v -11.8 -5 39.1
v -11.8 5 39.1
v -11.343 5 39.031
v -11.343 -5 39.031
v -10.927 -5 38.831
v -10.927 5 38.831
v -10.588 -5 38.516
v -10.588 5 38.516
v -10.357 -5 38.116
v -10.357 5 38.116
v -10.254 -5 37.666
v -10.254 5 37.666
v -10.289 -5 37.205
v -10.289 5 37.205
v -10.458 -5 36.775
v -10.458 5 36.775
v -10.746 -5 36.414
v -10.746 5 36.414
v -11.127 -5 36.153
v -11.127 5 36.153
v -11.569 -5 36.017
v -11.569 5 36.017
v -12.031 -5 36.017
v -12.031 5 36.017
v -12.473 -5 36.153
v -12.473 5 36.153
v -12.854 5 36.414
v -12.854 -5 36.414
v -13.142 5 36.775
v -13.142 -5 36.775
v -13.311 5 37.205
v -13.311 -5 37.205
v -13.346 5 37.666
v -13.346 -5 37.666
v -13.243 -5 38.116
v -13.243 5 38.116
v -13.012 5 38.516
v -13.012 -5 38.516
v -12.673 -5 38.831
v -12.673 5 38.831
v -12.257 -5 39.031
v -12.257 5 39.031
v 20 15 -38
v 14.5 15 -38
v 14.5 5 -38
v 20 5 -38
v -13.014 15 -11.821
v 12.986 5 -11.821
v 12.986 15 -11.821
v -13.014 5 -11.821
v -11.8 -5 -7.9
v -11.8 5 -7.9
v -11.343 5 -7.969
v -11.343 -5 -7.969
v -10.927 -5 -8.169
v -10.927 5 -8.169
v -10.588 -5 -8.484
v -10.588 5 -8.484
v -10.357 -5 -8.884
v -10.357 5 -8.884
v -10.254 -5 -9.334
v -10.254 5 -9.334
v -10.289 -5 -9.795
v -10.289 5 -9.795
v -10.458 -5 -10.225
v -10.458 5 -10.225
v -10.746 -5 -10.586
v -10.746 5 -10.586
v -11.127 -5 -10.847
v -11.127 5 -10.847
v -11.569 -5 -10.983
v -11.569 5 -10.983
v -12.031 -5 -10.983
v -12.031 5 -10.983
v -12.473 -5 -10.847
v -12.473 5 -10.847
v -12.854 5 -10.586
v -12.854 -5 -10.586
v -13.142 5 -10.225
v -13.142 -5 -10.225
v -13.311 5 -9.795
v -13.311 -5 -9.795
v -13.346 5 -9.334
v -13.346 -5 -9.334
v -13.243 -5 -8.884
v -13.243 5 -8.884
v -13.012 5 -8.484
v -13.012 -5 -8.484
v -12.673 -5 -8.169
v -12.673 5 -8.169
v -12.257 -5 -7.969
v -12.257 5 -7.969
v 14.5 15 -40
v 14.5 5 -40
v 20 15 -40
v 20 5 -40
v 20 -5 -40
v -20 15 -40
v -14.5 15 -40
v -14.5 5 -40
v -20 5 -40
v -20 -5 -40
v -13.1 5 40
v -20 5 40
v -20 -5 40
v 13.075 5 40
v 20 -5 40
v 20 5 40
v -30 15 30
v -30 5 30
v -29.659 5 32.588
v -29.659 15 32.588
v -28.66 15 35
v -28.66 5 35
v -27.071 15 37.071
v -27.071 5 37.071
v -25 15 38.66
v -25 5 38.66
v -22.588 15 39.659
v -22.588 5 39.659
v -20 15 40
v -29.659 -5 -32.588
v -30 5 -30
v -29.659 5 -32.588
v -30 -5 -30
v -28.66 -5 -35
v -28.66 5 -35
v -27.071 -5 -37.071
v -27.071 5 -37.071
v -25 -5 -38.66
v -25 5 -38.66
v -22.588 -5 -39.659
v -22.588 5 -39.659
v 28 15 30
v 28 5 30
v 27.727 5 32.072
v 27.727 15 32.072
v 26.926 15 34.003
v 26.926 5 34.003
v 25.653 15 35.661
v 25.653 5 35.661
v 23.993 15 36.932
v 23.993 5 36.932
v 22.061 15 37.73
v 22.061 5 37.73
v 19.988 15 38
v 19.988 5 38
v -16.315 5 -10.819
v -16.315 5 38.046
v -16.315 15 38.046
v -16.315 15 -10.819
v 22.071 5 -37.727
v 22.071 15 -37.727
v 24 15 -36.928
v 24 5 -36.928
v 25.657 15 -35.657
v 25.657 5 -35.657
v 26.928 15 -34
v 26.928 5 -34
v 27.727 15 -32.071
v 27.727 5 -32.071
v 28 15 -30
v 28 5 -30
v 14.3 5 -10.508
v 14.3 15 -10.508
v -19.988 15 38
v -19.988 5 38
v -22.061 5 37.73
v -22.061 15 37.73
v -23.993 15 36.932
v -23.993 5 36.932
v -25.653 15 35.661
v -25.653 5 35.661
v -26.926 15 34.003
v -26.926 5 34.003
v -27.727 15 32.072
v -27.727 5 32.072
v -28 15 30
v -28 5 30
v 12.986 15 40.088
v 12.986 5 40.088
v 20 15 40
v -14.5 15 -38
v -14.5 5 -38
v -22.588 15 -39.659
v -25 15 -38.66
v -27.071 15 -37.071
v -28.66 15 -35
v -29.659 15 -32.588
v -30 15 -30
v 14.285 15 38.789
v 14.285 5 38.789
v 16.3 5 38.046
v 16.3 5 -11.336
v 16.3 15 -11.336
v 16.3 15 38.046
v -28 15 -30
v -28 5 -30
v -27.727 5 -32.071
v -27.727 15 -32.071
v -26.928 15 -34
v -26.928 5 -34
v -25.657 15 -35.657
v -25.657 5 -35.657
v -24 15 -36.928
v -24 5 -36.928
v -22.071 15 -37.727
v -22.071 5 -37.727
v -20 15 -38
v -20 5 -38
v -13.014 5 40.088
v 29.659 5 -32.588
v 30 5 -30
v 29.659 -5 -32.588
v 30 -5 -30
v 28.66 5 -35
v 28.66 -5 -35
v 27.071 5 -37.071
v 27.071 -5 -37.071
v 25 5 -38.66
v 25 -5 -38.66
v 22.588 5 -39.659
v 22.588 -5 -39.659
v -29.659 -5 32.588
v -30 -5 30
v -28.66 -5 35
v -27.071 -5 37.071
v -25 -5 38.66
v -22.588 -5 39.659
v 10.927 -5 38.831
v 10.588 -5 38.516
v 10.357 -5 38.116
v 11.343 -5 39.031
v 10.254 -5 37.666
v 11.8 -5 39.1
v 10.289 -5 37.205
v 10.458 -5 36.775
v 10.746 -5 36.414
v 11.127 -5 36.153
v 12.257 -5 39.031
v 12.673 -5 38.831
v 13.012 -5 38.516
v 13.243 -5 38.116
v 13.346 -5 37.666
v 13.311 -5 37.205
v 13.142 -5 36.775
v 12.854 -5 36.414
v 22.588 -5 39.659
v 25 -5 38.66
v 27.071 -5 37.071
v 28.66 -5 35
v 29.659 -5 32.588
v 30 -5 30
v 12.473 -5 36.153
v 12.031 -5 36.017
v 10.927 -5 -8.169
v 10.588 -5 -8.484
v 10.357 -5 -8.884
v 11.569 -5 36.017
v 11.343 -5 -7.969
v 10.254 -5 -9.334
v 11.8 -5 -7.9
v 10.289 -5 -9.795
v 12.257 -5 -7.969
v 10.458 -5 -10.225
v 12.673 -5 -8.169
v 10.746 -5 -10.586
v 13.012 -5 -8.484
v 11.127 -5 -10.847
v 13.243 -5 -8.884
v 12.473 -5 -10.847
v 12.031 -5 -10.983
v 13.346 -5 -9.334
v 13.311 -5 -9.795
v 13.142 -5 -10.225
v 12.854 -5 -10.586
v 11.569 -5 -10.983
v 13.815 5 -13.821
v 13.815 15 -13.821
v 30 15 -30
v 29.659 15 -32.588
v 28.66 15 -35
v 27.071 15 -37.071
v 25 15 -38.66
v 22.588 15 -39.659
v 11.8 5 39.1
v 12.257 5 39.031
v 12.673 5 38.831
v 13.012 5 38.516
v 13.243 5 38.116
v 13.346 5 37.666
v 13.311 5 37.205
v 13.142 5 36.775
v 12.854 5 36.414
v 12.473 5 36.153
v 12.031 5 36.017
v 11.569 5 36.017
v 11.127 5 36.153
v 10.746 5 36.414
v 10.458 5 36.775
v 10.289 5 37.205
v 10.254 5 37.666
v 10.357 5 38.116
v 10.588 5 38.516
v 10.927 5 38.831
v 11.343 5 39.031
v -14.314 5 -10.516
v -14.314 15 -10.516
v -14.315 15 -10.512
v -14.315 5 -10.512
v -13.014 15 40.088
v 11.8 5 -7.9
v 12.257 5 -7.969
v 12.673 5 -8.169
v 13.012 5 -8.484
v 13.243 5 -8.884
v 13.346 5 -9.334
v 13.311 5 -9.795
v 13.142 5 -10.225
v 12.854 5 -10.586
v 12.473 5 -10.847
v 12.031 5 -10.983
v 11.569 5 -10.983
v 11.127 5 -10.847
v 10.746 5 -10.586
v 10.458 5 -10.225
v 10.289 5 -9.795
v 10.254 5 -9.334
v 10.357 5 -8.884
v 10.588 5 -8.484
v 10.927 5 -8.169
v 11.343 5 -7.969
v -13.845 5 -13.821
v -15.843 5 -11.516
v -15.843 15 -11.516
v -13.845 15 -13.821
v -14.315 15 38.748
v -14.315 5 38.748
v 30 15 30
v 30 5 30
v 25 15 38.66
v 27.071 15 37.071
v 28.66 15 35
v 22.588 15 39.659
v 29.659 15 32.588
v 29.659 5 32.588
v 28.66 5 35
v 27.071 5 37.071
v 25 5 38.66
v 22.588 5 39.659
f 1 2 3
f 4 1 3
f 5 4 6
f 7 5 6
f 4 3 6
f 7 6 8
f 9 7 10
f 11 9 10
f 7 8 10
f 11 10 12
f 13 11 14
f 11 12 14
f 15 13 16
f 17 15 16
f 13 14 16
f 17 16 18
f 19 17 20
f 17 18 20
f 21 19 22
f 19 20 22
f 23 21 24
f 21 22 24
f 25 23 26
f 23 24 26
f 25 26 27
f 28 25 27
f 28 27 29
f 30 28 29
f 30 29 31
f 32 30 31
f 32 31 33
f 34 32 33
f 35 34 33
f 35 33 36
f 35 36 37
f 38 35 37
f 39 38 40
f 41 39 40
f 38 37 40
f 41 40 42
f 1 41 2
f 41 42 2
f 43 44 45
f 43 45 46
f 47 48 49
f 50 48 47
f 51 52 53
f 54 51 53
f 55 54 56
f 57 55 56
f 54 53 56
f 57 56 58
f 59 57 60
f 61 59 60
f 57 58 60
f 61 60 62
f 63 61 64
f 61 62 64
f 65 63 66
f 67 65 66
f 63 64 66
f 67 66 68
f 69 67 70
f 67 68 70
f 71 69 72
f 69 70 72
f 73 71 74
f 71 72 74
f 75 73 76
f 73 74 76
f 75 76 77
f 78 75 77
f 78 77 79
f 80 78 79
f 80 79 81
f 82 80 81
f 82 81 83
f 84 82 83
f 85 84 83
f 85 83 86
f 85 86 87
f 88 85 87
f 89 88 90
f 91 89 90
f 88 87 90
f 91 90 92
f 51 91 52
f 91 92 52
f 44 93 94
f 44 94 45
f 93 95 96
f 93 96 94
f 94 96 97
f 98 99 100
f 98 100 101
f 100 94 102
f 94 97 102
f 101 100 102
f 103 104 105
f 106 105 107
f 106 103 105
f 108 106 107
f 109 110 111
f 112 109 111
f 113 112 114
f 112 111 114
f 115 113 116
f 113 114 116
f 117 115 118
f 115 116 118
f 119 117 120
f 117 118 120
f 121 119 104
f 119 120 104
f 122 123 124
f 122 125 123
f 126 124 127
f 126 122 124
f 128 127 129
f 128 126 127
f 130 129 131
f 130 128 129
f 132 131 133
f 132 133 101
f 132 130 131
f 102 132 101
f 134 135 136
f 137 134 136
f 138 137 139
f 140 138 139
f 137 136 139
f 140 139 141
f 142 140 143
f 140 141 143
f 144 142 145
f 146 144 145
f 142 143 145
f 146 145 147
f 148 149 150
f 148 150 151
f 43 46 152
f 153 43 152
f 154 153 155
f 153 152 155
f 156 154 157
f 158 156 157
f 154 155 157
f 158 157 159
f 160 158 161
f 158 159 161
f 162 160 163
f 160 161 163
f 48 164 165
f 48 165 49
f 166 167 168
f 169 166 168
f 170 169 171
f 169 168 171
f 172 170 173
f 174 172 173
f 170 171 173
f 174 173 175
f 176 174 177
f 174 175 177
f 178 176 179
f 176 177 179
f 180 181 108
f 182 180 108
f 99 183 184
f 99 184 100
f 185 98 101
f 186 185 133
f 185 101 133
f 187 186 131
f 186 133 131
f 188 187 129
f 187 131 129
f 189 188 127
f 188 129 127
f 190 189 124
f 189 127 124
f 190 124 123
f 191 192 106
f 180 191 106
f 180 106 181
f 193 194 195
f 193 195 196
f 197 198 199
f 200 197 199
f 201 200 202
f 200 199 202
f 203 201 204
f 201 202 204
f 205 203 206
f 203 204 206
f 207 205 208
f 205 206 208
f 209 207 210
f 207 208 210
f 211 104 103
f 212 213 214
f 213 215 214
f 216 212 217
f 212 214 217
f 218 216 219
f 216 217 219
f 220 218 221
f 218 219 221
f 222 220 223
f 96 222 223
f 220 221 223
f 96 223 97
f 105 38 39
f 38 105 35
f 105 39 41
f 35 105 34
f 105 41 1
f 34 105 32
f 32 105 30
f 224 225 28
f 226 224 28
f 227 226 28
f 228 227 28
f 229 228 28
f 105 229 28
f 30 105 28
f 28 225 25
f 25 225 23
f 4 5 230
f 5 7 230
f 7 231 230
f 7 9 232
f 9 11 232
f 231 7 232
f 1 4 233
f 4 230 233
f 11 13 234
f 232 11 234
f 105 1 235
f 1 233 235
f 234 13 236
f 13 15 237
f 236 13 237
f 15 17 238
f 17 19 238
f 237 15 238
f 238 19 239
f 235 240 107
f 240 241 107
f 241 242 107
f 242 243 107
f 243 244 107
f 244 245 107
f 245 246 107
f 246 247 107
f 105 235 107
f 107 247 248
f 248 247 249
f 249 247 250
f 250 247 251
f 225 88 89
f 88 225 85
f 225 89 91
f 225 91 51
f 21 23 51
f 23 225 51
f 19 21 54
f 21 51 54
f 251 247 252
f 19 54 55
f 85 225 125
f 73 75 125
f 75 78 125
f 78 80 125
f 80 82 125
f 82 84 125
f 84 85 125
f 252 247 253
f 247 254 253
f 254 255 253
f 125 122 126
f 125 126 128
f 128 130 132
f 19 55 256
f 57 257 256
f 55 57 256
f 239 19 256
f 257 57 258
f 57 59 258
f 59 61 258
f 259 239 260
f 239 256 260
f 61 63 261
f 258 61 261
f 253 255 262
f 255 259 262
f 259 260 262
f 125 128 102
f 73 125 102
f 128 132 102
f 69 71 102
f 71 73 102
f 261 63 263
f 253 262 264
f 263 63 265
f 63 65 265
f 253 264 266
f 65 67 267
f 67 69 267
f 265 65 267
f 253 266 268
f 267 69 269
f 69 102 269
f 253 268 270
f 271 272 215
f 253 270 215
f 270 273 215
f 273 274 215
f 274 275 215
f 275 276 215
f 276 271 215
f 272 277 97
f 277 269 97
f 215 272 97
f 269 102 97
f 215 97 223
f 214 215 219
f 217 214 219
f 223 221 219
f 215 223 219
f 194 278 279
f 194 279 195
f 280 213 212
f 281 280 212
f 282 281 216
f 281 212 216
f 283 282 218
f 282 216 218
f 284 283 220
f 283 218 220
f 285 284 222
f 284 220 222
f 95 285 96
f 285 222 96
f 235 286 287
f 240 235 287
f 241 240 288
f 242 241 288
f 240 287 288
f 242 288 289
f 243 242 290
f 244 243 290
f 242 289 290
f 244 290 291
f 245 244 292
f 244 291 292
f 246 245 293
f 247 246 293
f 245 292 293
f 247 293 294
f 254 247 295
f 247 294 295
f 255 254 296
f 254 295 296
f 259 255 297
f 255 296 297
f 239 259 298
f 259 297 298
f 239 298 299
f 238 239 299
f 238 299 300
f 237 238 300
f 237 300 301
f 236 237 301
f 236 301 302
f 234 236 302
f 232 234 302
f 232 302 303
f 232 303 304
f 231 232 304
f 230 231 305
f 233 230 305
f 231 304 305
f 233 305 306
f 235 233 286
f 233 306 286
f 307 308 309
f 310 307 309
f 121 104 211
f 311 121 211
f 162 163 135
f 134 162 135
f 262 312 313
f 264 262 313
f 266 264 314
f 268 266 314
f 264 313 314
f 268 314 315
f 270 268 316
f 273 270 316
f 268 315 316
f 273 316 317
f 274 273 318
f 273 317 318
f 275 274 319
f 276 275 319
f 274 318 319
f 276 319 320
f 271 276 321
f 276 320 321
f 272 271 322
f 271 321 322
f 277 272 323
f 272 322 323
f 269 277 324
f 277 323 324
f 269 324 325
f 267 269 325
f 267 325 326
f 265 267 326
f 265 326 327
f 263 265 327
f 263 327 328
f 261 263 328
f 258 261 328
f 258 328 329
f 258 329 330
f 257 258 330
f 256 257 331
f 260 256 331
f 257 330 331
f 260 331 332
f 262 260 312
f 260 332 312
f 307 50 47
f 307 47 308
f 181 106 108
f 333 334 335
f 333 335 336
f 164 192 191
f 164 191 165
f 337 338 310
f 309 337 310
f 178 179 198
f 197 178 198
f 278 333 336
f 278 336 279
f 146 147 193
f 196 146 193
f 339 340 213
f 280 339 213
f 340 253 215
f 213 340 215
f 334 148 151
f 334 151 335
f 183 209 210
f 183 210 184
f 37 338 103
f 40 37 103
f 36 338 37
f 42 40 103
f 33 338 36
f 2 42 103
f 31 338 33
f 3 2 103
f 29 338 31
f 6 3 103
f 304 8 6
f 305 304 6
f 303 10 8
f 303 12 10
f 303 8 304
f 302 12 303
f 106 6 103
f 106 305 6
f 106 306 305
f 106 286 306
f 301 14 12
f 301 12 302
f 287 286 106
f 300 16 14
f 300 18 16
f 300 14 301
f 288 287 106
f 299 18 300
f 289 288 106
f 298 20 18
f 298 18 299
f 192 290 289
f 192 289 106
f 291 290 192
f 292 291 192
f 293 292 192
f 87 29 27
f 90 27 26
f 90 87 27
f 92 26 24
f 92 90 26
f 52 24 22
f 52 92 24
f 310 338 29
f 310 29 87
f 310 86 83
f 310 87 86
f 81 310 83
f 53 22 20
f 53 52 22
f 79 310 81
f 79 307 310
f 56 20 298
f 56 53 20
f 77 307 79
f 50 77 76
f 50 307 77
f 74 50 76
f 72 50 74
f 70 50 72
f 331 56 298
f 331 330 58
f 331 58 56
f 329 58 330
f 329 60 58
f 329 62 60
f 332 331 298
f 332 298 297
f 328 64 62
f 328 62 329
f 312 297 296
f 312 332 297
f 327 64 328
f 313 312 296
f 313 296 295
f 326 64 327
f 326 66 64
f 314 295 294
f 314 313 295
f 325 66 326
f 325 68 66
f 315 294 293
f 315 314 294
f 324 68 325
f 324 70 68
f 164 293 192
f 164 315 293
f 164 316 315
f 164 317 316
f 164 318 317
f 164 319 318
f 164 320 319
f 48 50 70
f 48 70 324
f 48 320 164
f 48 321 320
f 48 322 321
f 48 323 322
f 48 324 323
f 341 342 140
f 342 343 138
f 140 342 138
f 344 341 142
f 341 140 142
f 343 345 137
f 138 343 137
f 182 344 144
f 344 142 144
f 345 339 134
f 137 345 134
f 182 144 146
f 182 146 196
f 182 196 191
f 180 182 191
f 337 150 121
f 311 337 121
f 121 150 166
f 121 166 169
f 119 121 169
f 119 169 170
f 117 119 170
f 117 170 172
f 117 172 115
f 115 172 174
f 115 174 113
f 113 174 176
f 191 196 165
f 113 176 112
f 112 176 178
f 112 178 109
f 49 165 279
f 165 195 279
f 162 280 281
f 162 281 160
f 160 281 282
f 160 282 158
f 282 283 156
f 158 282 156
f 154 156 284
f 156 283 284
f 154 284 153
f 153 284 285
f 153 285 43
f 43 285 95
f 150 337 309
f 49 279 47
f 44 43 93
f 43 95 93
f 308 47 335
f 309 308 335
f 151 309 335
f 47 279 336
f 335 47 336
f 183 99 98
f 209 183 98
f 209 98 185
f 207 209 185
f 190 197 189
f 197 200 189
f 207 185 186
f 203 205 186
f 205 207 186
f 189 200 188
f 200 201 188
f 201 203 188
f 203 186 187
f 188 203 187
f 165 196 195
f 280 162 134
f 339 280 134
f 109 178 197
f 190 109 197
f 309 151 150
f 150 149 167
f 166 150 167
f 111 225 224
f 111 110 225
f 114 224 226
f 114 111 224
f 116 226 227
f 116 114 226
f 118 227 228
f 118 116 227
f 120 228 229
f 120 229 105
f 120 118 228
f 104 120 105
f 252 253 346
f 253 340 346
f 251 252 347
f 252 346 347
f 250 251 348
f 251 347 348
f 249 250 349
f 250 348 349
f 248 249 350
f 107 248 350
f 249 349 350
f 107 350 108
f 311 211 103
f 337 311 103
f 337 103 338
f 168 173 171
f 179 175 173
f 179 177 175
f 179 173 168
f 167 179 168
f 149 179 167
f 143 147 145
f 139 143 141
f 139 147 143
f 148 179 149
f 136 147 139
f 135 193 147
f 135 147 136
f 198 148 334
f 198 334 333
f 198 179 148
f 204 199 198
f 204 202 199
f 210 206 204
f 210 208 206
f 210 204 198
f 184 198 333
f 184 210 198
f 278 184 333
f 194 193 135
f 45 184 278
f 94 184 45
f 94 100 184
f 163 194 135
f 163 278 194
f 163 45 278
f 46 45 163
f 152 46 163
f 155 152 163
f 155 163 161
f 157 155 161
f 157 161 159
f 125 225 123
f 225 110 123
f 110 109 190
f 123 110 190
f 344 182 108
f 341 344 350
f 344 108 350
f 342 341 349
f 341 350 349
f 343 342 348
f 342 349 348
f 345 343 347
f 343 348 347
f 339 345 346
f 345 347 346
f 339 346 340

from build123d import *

# Parameters (mm, degrees)
SKETCH1_W           = 60
SKETCH1_H           = 80
BOSS_EXTRUDE1_DEPTH = 5
FILLET1_R           = 10
SKETCH3_R           = 1.55
CUT_EXTRUDE11_DEPTH = 10
BOSS_EXTRUDE2_DEPTH = 10
BOSS_EXTRUDE3_DEPTH = 10


with BuildPart() as part:
    # Sketch1 → Boss-Extrude1 (new, symmetric)
    with BuildSketch(Plane(origin=(0, 0, 0), x_dir=(1, 0, 0), z_dir=(0, 1, 0))):
        Rectangle(SKETCH1_W, SKETCH1_H)
    extrude(amount=BOSS_EXTRUDE1_DEPTH, both=True)

    # Fillet1
    fillet1_edges = [part.edges().sort_by_distance(p)[0] for p in [
        (-30, 0, -40),
        (30, 0, -40),
        (30, 0, 40),
        (-30, 0, 40),
    ]]
    fillet(fillet1_edges, radius=FILLET1_R)

    # Sketch3 → Cut-Extrude11 (cut)
    with BuildSketch(Plane(origin=(0, 5, 0), x_dir=(1, 0, 0), z_dir=(0, 1, 0))):
        with Locations(Location((-11.8, 9.45, 0), (0, 0, 270))):
            Circle(SKETCH3_R)
        with Locations(Location((11.8, 9.45, 0), (0, 0, 270))):
            Circle(SKETCH3_R)
        with Locations(Location((-11.8, -37.55, 0), (0, 0, 270))):
            Circle(SKETCH3_R)
        with Locations(Location((11.8, -37.55, 0), (0, 0, 270))):
            Circle(SKETCH3_R)
    extrude(amount=-CUT_EXTRUDE11_DEPTH, mode=Mode.SUBTRACT)

    # Sketch6 → Boss-Extrude2 (add)
    with BuildSketch(Plane(origin=(0, 5, 0), x_dir=(1, 0, 0), z_dir=(0, 1, 0))):
        with BuildLine():
            Line((30, -30), (30, 30))
            ThreePointArc((30, 30), (27.071067812, 37.071067812), (20, 40))
            Line((20, 40), (14.5, 40))
            Line((14.5, 40), (14.5, 38))
            Line((14.5, 38), (20, 38))
            ThreePointArc((20, 38), (25.656854249, 35.656854249), (28, 30))
            Line((28, 30), (28, -30))
            ThreePointArc((28, -30), (25.652656249, -35.661049137), (19.988130666, -37.999991195))
            Line((19.988130666, -37.999991195), (14.301118682, -38.071478623))
            Line((14.301118682, -38.071478623), (14.285233791, -38.789415009))
            Line((14.285233791, -38.789415009), (12.98648686, -40.088161941))
            Line((12.98648686, -40.088161941), (20, -40))
            ThreePointArc((20, -40), (27.071067812, -37.071067812), (30, -30))
        make_face()
        with BuildLine():
            Line((-30, 30), (-30, -30))
            ThreePointArc((-30, -30), (-27.071067812, -37.071067812), (-20, -40))
            Line((-20, -40), (-13.014230023, -40.088161941))
            Line((-13.014230023, -40.088161941), (-14.314872692, -38.748440589))
            Line((-14.314872692, -38.748440589), (-14.314872692, -38.071588283))
            Line((-14.314872692, -38.071588283), (-19.988083532, -37.999991125))
            ThreePointArc((-19.988083532, -37.999991125), (-25.652639572, -35.661065789), (-28, -30))
            Line((-28, -30), (-28, 30))
            ThreePointArc((-28, 30), (-25.656854249, 35.656854249), (-20, 38))
            Line((-20, 38), (-14.5, 38))
            Line((-14.5, 38), (-14.5, 40))
            Line((-14.5, 40), (-20, 40))
            ThreePointArc((-20, 40), (-27.071067812, 37.071067812), (-30, 30))
        make_face()
    extrude(amount=BOSS_EXTRUDE2_DEPTH)

    # Sketch5 → Boss-Extrude3 (add)
    with BuildSketch(Plane(origin=(0, 5, 0), x_dir=(1, 0, 0), z_dir=(0, 1, 0))):
        Polygon((14.285233791, -38.789415009), (14.3, 10.507634941), (12.98648686, 11.821148081), (-13.014230023, 11.821148081), (-14.31369616, 10.516205754), (-14.314872692, 10.512459037), (-14.314872692, -38.748440589), (-16.314872692, -38.748440589), (-16.314872692, 10.819094366), (-15.842590188, 11.515908447), (-13.84512164, 13.821148081), (13.814913984, 13.821148081), (16.300248159, 11.335813907), (16.300248159, -38.789415009), align=None)
    extrude(amount=BOSS_EXTRUDE3_DEPTH)


solid = part.part
